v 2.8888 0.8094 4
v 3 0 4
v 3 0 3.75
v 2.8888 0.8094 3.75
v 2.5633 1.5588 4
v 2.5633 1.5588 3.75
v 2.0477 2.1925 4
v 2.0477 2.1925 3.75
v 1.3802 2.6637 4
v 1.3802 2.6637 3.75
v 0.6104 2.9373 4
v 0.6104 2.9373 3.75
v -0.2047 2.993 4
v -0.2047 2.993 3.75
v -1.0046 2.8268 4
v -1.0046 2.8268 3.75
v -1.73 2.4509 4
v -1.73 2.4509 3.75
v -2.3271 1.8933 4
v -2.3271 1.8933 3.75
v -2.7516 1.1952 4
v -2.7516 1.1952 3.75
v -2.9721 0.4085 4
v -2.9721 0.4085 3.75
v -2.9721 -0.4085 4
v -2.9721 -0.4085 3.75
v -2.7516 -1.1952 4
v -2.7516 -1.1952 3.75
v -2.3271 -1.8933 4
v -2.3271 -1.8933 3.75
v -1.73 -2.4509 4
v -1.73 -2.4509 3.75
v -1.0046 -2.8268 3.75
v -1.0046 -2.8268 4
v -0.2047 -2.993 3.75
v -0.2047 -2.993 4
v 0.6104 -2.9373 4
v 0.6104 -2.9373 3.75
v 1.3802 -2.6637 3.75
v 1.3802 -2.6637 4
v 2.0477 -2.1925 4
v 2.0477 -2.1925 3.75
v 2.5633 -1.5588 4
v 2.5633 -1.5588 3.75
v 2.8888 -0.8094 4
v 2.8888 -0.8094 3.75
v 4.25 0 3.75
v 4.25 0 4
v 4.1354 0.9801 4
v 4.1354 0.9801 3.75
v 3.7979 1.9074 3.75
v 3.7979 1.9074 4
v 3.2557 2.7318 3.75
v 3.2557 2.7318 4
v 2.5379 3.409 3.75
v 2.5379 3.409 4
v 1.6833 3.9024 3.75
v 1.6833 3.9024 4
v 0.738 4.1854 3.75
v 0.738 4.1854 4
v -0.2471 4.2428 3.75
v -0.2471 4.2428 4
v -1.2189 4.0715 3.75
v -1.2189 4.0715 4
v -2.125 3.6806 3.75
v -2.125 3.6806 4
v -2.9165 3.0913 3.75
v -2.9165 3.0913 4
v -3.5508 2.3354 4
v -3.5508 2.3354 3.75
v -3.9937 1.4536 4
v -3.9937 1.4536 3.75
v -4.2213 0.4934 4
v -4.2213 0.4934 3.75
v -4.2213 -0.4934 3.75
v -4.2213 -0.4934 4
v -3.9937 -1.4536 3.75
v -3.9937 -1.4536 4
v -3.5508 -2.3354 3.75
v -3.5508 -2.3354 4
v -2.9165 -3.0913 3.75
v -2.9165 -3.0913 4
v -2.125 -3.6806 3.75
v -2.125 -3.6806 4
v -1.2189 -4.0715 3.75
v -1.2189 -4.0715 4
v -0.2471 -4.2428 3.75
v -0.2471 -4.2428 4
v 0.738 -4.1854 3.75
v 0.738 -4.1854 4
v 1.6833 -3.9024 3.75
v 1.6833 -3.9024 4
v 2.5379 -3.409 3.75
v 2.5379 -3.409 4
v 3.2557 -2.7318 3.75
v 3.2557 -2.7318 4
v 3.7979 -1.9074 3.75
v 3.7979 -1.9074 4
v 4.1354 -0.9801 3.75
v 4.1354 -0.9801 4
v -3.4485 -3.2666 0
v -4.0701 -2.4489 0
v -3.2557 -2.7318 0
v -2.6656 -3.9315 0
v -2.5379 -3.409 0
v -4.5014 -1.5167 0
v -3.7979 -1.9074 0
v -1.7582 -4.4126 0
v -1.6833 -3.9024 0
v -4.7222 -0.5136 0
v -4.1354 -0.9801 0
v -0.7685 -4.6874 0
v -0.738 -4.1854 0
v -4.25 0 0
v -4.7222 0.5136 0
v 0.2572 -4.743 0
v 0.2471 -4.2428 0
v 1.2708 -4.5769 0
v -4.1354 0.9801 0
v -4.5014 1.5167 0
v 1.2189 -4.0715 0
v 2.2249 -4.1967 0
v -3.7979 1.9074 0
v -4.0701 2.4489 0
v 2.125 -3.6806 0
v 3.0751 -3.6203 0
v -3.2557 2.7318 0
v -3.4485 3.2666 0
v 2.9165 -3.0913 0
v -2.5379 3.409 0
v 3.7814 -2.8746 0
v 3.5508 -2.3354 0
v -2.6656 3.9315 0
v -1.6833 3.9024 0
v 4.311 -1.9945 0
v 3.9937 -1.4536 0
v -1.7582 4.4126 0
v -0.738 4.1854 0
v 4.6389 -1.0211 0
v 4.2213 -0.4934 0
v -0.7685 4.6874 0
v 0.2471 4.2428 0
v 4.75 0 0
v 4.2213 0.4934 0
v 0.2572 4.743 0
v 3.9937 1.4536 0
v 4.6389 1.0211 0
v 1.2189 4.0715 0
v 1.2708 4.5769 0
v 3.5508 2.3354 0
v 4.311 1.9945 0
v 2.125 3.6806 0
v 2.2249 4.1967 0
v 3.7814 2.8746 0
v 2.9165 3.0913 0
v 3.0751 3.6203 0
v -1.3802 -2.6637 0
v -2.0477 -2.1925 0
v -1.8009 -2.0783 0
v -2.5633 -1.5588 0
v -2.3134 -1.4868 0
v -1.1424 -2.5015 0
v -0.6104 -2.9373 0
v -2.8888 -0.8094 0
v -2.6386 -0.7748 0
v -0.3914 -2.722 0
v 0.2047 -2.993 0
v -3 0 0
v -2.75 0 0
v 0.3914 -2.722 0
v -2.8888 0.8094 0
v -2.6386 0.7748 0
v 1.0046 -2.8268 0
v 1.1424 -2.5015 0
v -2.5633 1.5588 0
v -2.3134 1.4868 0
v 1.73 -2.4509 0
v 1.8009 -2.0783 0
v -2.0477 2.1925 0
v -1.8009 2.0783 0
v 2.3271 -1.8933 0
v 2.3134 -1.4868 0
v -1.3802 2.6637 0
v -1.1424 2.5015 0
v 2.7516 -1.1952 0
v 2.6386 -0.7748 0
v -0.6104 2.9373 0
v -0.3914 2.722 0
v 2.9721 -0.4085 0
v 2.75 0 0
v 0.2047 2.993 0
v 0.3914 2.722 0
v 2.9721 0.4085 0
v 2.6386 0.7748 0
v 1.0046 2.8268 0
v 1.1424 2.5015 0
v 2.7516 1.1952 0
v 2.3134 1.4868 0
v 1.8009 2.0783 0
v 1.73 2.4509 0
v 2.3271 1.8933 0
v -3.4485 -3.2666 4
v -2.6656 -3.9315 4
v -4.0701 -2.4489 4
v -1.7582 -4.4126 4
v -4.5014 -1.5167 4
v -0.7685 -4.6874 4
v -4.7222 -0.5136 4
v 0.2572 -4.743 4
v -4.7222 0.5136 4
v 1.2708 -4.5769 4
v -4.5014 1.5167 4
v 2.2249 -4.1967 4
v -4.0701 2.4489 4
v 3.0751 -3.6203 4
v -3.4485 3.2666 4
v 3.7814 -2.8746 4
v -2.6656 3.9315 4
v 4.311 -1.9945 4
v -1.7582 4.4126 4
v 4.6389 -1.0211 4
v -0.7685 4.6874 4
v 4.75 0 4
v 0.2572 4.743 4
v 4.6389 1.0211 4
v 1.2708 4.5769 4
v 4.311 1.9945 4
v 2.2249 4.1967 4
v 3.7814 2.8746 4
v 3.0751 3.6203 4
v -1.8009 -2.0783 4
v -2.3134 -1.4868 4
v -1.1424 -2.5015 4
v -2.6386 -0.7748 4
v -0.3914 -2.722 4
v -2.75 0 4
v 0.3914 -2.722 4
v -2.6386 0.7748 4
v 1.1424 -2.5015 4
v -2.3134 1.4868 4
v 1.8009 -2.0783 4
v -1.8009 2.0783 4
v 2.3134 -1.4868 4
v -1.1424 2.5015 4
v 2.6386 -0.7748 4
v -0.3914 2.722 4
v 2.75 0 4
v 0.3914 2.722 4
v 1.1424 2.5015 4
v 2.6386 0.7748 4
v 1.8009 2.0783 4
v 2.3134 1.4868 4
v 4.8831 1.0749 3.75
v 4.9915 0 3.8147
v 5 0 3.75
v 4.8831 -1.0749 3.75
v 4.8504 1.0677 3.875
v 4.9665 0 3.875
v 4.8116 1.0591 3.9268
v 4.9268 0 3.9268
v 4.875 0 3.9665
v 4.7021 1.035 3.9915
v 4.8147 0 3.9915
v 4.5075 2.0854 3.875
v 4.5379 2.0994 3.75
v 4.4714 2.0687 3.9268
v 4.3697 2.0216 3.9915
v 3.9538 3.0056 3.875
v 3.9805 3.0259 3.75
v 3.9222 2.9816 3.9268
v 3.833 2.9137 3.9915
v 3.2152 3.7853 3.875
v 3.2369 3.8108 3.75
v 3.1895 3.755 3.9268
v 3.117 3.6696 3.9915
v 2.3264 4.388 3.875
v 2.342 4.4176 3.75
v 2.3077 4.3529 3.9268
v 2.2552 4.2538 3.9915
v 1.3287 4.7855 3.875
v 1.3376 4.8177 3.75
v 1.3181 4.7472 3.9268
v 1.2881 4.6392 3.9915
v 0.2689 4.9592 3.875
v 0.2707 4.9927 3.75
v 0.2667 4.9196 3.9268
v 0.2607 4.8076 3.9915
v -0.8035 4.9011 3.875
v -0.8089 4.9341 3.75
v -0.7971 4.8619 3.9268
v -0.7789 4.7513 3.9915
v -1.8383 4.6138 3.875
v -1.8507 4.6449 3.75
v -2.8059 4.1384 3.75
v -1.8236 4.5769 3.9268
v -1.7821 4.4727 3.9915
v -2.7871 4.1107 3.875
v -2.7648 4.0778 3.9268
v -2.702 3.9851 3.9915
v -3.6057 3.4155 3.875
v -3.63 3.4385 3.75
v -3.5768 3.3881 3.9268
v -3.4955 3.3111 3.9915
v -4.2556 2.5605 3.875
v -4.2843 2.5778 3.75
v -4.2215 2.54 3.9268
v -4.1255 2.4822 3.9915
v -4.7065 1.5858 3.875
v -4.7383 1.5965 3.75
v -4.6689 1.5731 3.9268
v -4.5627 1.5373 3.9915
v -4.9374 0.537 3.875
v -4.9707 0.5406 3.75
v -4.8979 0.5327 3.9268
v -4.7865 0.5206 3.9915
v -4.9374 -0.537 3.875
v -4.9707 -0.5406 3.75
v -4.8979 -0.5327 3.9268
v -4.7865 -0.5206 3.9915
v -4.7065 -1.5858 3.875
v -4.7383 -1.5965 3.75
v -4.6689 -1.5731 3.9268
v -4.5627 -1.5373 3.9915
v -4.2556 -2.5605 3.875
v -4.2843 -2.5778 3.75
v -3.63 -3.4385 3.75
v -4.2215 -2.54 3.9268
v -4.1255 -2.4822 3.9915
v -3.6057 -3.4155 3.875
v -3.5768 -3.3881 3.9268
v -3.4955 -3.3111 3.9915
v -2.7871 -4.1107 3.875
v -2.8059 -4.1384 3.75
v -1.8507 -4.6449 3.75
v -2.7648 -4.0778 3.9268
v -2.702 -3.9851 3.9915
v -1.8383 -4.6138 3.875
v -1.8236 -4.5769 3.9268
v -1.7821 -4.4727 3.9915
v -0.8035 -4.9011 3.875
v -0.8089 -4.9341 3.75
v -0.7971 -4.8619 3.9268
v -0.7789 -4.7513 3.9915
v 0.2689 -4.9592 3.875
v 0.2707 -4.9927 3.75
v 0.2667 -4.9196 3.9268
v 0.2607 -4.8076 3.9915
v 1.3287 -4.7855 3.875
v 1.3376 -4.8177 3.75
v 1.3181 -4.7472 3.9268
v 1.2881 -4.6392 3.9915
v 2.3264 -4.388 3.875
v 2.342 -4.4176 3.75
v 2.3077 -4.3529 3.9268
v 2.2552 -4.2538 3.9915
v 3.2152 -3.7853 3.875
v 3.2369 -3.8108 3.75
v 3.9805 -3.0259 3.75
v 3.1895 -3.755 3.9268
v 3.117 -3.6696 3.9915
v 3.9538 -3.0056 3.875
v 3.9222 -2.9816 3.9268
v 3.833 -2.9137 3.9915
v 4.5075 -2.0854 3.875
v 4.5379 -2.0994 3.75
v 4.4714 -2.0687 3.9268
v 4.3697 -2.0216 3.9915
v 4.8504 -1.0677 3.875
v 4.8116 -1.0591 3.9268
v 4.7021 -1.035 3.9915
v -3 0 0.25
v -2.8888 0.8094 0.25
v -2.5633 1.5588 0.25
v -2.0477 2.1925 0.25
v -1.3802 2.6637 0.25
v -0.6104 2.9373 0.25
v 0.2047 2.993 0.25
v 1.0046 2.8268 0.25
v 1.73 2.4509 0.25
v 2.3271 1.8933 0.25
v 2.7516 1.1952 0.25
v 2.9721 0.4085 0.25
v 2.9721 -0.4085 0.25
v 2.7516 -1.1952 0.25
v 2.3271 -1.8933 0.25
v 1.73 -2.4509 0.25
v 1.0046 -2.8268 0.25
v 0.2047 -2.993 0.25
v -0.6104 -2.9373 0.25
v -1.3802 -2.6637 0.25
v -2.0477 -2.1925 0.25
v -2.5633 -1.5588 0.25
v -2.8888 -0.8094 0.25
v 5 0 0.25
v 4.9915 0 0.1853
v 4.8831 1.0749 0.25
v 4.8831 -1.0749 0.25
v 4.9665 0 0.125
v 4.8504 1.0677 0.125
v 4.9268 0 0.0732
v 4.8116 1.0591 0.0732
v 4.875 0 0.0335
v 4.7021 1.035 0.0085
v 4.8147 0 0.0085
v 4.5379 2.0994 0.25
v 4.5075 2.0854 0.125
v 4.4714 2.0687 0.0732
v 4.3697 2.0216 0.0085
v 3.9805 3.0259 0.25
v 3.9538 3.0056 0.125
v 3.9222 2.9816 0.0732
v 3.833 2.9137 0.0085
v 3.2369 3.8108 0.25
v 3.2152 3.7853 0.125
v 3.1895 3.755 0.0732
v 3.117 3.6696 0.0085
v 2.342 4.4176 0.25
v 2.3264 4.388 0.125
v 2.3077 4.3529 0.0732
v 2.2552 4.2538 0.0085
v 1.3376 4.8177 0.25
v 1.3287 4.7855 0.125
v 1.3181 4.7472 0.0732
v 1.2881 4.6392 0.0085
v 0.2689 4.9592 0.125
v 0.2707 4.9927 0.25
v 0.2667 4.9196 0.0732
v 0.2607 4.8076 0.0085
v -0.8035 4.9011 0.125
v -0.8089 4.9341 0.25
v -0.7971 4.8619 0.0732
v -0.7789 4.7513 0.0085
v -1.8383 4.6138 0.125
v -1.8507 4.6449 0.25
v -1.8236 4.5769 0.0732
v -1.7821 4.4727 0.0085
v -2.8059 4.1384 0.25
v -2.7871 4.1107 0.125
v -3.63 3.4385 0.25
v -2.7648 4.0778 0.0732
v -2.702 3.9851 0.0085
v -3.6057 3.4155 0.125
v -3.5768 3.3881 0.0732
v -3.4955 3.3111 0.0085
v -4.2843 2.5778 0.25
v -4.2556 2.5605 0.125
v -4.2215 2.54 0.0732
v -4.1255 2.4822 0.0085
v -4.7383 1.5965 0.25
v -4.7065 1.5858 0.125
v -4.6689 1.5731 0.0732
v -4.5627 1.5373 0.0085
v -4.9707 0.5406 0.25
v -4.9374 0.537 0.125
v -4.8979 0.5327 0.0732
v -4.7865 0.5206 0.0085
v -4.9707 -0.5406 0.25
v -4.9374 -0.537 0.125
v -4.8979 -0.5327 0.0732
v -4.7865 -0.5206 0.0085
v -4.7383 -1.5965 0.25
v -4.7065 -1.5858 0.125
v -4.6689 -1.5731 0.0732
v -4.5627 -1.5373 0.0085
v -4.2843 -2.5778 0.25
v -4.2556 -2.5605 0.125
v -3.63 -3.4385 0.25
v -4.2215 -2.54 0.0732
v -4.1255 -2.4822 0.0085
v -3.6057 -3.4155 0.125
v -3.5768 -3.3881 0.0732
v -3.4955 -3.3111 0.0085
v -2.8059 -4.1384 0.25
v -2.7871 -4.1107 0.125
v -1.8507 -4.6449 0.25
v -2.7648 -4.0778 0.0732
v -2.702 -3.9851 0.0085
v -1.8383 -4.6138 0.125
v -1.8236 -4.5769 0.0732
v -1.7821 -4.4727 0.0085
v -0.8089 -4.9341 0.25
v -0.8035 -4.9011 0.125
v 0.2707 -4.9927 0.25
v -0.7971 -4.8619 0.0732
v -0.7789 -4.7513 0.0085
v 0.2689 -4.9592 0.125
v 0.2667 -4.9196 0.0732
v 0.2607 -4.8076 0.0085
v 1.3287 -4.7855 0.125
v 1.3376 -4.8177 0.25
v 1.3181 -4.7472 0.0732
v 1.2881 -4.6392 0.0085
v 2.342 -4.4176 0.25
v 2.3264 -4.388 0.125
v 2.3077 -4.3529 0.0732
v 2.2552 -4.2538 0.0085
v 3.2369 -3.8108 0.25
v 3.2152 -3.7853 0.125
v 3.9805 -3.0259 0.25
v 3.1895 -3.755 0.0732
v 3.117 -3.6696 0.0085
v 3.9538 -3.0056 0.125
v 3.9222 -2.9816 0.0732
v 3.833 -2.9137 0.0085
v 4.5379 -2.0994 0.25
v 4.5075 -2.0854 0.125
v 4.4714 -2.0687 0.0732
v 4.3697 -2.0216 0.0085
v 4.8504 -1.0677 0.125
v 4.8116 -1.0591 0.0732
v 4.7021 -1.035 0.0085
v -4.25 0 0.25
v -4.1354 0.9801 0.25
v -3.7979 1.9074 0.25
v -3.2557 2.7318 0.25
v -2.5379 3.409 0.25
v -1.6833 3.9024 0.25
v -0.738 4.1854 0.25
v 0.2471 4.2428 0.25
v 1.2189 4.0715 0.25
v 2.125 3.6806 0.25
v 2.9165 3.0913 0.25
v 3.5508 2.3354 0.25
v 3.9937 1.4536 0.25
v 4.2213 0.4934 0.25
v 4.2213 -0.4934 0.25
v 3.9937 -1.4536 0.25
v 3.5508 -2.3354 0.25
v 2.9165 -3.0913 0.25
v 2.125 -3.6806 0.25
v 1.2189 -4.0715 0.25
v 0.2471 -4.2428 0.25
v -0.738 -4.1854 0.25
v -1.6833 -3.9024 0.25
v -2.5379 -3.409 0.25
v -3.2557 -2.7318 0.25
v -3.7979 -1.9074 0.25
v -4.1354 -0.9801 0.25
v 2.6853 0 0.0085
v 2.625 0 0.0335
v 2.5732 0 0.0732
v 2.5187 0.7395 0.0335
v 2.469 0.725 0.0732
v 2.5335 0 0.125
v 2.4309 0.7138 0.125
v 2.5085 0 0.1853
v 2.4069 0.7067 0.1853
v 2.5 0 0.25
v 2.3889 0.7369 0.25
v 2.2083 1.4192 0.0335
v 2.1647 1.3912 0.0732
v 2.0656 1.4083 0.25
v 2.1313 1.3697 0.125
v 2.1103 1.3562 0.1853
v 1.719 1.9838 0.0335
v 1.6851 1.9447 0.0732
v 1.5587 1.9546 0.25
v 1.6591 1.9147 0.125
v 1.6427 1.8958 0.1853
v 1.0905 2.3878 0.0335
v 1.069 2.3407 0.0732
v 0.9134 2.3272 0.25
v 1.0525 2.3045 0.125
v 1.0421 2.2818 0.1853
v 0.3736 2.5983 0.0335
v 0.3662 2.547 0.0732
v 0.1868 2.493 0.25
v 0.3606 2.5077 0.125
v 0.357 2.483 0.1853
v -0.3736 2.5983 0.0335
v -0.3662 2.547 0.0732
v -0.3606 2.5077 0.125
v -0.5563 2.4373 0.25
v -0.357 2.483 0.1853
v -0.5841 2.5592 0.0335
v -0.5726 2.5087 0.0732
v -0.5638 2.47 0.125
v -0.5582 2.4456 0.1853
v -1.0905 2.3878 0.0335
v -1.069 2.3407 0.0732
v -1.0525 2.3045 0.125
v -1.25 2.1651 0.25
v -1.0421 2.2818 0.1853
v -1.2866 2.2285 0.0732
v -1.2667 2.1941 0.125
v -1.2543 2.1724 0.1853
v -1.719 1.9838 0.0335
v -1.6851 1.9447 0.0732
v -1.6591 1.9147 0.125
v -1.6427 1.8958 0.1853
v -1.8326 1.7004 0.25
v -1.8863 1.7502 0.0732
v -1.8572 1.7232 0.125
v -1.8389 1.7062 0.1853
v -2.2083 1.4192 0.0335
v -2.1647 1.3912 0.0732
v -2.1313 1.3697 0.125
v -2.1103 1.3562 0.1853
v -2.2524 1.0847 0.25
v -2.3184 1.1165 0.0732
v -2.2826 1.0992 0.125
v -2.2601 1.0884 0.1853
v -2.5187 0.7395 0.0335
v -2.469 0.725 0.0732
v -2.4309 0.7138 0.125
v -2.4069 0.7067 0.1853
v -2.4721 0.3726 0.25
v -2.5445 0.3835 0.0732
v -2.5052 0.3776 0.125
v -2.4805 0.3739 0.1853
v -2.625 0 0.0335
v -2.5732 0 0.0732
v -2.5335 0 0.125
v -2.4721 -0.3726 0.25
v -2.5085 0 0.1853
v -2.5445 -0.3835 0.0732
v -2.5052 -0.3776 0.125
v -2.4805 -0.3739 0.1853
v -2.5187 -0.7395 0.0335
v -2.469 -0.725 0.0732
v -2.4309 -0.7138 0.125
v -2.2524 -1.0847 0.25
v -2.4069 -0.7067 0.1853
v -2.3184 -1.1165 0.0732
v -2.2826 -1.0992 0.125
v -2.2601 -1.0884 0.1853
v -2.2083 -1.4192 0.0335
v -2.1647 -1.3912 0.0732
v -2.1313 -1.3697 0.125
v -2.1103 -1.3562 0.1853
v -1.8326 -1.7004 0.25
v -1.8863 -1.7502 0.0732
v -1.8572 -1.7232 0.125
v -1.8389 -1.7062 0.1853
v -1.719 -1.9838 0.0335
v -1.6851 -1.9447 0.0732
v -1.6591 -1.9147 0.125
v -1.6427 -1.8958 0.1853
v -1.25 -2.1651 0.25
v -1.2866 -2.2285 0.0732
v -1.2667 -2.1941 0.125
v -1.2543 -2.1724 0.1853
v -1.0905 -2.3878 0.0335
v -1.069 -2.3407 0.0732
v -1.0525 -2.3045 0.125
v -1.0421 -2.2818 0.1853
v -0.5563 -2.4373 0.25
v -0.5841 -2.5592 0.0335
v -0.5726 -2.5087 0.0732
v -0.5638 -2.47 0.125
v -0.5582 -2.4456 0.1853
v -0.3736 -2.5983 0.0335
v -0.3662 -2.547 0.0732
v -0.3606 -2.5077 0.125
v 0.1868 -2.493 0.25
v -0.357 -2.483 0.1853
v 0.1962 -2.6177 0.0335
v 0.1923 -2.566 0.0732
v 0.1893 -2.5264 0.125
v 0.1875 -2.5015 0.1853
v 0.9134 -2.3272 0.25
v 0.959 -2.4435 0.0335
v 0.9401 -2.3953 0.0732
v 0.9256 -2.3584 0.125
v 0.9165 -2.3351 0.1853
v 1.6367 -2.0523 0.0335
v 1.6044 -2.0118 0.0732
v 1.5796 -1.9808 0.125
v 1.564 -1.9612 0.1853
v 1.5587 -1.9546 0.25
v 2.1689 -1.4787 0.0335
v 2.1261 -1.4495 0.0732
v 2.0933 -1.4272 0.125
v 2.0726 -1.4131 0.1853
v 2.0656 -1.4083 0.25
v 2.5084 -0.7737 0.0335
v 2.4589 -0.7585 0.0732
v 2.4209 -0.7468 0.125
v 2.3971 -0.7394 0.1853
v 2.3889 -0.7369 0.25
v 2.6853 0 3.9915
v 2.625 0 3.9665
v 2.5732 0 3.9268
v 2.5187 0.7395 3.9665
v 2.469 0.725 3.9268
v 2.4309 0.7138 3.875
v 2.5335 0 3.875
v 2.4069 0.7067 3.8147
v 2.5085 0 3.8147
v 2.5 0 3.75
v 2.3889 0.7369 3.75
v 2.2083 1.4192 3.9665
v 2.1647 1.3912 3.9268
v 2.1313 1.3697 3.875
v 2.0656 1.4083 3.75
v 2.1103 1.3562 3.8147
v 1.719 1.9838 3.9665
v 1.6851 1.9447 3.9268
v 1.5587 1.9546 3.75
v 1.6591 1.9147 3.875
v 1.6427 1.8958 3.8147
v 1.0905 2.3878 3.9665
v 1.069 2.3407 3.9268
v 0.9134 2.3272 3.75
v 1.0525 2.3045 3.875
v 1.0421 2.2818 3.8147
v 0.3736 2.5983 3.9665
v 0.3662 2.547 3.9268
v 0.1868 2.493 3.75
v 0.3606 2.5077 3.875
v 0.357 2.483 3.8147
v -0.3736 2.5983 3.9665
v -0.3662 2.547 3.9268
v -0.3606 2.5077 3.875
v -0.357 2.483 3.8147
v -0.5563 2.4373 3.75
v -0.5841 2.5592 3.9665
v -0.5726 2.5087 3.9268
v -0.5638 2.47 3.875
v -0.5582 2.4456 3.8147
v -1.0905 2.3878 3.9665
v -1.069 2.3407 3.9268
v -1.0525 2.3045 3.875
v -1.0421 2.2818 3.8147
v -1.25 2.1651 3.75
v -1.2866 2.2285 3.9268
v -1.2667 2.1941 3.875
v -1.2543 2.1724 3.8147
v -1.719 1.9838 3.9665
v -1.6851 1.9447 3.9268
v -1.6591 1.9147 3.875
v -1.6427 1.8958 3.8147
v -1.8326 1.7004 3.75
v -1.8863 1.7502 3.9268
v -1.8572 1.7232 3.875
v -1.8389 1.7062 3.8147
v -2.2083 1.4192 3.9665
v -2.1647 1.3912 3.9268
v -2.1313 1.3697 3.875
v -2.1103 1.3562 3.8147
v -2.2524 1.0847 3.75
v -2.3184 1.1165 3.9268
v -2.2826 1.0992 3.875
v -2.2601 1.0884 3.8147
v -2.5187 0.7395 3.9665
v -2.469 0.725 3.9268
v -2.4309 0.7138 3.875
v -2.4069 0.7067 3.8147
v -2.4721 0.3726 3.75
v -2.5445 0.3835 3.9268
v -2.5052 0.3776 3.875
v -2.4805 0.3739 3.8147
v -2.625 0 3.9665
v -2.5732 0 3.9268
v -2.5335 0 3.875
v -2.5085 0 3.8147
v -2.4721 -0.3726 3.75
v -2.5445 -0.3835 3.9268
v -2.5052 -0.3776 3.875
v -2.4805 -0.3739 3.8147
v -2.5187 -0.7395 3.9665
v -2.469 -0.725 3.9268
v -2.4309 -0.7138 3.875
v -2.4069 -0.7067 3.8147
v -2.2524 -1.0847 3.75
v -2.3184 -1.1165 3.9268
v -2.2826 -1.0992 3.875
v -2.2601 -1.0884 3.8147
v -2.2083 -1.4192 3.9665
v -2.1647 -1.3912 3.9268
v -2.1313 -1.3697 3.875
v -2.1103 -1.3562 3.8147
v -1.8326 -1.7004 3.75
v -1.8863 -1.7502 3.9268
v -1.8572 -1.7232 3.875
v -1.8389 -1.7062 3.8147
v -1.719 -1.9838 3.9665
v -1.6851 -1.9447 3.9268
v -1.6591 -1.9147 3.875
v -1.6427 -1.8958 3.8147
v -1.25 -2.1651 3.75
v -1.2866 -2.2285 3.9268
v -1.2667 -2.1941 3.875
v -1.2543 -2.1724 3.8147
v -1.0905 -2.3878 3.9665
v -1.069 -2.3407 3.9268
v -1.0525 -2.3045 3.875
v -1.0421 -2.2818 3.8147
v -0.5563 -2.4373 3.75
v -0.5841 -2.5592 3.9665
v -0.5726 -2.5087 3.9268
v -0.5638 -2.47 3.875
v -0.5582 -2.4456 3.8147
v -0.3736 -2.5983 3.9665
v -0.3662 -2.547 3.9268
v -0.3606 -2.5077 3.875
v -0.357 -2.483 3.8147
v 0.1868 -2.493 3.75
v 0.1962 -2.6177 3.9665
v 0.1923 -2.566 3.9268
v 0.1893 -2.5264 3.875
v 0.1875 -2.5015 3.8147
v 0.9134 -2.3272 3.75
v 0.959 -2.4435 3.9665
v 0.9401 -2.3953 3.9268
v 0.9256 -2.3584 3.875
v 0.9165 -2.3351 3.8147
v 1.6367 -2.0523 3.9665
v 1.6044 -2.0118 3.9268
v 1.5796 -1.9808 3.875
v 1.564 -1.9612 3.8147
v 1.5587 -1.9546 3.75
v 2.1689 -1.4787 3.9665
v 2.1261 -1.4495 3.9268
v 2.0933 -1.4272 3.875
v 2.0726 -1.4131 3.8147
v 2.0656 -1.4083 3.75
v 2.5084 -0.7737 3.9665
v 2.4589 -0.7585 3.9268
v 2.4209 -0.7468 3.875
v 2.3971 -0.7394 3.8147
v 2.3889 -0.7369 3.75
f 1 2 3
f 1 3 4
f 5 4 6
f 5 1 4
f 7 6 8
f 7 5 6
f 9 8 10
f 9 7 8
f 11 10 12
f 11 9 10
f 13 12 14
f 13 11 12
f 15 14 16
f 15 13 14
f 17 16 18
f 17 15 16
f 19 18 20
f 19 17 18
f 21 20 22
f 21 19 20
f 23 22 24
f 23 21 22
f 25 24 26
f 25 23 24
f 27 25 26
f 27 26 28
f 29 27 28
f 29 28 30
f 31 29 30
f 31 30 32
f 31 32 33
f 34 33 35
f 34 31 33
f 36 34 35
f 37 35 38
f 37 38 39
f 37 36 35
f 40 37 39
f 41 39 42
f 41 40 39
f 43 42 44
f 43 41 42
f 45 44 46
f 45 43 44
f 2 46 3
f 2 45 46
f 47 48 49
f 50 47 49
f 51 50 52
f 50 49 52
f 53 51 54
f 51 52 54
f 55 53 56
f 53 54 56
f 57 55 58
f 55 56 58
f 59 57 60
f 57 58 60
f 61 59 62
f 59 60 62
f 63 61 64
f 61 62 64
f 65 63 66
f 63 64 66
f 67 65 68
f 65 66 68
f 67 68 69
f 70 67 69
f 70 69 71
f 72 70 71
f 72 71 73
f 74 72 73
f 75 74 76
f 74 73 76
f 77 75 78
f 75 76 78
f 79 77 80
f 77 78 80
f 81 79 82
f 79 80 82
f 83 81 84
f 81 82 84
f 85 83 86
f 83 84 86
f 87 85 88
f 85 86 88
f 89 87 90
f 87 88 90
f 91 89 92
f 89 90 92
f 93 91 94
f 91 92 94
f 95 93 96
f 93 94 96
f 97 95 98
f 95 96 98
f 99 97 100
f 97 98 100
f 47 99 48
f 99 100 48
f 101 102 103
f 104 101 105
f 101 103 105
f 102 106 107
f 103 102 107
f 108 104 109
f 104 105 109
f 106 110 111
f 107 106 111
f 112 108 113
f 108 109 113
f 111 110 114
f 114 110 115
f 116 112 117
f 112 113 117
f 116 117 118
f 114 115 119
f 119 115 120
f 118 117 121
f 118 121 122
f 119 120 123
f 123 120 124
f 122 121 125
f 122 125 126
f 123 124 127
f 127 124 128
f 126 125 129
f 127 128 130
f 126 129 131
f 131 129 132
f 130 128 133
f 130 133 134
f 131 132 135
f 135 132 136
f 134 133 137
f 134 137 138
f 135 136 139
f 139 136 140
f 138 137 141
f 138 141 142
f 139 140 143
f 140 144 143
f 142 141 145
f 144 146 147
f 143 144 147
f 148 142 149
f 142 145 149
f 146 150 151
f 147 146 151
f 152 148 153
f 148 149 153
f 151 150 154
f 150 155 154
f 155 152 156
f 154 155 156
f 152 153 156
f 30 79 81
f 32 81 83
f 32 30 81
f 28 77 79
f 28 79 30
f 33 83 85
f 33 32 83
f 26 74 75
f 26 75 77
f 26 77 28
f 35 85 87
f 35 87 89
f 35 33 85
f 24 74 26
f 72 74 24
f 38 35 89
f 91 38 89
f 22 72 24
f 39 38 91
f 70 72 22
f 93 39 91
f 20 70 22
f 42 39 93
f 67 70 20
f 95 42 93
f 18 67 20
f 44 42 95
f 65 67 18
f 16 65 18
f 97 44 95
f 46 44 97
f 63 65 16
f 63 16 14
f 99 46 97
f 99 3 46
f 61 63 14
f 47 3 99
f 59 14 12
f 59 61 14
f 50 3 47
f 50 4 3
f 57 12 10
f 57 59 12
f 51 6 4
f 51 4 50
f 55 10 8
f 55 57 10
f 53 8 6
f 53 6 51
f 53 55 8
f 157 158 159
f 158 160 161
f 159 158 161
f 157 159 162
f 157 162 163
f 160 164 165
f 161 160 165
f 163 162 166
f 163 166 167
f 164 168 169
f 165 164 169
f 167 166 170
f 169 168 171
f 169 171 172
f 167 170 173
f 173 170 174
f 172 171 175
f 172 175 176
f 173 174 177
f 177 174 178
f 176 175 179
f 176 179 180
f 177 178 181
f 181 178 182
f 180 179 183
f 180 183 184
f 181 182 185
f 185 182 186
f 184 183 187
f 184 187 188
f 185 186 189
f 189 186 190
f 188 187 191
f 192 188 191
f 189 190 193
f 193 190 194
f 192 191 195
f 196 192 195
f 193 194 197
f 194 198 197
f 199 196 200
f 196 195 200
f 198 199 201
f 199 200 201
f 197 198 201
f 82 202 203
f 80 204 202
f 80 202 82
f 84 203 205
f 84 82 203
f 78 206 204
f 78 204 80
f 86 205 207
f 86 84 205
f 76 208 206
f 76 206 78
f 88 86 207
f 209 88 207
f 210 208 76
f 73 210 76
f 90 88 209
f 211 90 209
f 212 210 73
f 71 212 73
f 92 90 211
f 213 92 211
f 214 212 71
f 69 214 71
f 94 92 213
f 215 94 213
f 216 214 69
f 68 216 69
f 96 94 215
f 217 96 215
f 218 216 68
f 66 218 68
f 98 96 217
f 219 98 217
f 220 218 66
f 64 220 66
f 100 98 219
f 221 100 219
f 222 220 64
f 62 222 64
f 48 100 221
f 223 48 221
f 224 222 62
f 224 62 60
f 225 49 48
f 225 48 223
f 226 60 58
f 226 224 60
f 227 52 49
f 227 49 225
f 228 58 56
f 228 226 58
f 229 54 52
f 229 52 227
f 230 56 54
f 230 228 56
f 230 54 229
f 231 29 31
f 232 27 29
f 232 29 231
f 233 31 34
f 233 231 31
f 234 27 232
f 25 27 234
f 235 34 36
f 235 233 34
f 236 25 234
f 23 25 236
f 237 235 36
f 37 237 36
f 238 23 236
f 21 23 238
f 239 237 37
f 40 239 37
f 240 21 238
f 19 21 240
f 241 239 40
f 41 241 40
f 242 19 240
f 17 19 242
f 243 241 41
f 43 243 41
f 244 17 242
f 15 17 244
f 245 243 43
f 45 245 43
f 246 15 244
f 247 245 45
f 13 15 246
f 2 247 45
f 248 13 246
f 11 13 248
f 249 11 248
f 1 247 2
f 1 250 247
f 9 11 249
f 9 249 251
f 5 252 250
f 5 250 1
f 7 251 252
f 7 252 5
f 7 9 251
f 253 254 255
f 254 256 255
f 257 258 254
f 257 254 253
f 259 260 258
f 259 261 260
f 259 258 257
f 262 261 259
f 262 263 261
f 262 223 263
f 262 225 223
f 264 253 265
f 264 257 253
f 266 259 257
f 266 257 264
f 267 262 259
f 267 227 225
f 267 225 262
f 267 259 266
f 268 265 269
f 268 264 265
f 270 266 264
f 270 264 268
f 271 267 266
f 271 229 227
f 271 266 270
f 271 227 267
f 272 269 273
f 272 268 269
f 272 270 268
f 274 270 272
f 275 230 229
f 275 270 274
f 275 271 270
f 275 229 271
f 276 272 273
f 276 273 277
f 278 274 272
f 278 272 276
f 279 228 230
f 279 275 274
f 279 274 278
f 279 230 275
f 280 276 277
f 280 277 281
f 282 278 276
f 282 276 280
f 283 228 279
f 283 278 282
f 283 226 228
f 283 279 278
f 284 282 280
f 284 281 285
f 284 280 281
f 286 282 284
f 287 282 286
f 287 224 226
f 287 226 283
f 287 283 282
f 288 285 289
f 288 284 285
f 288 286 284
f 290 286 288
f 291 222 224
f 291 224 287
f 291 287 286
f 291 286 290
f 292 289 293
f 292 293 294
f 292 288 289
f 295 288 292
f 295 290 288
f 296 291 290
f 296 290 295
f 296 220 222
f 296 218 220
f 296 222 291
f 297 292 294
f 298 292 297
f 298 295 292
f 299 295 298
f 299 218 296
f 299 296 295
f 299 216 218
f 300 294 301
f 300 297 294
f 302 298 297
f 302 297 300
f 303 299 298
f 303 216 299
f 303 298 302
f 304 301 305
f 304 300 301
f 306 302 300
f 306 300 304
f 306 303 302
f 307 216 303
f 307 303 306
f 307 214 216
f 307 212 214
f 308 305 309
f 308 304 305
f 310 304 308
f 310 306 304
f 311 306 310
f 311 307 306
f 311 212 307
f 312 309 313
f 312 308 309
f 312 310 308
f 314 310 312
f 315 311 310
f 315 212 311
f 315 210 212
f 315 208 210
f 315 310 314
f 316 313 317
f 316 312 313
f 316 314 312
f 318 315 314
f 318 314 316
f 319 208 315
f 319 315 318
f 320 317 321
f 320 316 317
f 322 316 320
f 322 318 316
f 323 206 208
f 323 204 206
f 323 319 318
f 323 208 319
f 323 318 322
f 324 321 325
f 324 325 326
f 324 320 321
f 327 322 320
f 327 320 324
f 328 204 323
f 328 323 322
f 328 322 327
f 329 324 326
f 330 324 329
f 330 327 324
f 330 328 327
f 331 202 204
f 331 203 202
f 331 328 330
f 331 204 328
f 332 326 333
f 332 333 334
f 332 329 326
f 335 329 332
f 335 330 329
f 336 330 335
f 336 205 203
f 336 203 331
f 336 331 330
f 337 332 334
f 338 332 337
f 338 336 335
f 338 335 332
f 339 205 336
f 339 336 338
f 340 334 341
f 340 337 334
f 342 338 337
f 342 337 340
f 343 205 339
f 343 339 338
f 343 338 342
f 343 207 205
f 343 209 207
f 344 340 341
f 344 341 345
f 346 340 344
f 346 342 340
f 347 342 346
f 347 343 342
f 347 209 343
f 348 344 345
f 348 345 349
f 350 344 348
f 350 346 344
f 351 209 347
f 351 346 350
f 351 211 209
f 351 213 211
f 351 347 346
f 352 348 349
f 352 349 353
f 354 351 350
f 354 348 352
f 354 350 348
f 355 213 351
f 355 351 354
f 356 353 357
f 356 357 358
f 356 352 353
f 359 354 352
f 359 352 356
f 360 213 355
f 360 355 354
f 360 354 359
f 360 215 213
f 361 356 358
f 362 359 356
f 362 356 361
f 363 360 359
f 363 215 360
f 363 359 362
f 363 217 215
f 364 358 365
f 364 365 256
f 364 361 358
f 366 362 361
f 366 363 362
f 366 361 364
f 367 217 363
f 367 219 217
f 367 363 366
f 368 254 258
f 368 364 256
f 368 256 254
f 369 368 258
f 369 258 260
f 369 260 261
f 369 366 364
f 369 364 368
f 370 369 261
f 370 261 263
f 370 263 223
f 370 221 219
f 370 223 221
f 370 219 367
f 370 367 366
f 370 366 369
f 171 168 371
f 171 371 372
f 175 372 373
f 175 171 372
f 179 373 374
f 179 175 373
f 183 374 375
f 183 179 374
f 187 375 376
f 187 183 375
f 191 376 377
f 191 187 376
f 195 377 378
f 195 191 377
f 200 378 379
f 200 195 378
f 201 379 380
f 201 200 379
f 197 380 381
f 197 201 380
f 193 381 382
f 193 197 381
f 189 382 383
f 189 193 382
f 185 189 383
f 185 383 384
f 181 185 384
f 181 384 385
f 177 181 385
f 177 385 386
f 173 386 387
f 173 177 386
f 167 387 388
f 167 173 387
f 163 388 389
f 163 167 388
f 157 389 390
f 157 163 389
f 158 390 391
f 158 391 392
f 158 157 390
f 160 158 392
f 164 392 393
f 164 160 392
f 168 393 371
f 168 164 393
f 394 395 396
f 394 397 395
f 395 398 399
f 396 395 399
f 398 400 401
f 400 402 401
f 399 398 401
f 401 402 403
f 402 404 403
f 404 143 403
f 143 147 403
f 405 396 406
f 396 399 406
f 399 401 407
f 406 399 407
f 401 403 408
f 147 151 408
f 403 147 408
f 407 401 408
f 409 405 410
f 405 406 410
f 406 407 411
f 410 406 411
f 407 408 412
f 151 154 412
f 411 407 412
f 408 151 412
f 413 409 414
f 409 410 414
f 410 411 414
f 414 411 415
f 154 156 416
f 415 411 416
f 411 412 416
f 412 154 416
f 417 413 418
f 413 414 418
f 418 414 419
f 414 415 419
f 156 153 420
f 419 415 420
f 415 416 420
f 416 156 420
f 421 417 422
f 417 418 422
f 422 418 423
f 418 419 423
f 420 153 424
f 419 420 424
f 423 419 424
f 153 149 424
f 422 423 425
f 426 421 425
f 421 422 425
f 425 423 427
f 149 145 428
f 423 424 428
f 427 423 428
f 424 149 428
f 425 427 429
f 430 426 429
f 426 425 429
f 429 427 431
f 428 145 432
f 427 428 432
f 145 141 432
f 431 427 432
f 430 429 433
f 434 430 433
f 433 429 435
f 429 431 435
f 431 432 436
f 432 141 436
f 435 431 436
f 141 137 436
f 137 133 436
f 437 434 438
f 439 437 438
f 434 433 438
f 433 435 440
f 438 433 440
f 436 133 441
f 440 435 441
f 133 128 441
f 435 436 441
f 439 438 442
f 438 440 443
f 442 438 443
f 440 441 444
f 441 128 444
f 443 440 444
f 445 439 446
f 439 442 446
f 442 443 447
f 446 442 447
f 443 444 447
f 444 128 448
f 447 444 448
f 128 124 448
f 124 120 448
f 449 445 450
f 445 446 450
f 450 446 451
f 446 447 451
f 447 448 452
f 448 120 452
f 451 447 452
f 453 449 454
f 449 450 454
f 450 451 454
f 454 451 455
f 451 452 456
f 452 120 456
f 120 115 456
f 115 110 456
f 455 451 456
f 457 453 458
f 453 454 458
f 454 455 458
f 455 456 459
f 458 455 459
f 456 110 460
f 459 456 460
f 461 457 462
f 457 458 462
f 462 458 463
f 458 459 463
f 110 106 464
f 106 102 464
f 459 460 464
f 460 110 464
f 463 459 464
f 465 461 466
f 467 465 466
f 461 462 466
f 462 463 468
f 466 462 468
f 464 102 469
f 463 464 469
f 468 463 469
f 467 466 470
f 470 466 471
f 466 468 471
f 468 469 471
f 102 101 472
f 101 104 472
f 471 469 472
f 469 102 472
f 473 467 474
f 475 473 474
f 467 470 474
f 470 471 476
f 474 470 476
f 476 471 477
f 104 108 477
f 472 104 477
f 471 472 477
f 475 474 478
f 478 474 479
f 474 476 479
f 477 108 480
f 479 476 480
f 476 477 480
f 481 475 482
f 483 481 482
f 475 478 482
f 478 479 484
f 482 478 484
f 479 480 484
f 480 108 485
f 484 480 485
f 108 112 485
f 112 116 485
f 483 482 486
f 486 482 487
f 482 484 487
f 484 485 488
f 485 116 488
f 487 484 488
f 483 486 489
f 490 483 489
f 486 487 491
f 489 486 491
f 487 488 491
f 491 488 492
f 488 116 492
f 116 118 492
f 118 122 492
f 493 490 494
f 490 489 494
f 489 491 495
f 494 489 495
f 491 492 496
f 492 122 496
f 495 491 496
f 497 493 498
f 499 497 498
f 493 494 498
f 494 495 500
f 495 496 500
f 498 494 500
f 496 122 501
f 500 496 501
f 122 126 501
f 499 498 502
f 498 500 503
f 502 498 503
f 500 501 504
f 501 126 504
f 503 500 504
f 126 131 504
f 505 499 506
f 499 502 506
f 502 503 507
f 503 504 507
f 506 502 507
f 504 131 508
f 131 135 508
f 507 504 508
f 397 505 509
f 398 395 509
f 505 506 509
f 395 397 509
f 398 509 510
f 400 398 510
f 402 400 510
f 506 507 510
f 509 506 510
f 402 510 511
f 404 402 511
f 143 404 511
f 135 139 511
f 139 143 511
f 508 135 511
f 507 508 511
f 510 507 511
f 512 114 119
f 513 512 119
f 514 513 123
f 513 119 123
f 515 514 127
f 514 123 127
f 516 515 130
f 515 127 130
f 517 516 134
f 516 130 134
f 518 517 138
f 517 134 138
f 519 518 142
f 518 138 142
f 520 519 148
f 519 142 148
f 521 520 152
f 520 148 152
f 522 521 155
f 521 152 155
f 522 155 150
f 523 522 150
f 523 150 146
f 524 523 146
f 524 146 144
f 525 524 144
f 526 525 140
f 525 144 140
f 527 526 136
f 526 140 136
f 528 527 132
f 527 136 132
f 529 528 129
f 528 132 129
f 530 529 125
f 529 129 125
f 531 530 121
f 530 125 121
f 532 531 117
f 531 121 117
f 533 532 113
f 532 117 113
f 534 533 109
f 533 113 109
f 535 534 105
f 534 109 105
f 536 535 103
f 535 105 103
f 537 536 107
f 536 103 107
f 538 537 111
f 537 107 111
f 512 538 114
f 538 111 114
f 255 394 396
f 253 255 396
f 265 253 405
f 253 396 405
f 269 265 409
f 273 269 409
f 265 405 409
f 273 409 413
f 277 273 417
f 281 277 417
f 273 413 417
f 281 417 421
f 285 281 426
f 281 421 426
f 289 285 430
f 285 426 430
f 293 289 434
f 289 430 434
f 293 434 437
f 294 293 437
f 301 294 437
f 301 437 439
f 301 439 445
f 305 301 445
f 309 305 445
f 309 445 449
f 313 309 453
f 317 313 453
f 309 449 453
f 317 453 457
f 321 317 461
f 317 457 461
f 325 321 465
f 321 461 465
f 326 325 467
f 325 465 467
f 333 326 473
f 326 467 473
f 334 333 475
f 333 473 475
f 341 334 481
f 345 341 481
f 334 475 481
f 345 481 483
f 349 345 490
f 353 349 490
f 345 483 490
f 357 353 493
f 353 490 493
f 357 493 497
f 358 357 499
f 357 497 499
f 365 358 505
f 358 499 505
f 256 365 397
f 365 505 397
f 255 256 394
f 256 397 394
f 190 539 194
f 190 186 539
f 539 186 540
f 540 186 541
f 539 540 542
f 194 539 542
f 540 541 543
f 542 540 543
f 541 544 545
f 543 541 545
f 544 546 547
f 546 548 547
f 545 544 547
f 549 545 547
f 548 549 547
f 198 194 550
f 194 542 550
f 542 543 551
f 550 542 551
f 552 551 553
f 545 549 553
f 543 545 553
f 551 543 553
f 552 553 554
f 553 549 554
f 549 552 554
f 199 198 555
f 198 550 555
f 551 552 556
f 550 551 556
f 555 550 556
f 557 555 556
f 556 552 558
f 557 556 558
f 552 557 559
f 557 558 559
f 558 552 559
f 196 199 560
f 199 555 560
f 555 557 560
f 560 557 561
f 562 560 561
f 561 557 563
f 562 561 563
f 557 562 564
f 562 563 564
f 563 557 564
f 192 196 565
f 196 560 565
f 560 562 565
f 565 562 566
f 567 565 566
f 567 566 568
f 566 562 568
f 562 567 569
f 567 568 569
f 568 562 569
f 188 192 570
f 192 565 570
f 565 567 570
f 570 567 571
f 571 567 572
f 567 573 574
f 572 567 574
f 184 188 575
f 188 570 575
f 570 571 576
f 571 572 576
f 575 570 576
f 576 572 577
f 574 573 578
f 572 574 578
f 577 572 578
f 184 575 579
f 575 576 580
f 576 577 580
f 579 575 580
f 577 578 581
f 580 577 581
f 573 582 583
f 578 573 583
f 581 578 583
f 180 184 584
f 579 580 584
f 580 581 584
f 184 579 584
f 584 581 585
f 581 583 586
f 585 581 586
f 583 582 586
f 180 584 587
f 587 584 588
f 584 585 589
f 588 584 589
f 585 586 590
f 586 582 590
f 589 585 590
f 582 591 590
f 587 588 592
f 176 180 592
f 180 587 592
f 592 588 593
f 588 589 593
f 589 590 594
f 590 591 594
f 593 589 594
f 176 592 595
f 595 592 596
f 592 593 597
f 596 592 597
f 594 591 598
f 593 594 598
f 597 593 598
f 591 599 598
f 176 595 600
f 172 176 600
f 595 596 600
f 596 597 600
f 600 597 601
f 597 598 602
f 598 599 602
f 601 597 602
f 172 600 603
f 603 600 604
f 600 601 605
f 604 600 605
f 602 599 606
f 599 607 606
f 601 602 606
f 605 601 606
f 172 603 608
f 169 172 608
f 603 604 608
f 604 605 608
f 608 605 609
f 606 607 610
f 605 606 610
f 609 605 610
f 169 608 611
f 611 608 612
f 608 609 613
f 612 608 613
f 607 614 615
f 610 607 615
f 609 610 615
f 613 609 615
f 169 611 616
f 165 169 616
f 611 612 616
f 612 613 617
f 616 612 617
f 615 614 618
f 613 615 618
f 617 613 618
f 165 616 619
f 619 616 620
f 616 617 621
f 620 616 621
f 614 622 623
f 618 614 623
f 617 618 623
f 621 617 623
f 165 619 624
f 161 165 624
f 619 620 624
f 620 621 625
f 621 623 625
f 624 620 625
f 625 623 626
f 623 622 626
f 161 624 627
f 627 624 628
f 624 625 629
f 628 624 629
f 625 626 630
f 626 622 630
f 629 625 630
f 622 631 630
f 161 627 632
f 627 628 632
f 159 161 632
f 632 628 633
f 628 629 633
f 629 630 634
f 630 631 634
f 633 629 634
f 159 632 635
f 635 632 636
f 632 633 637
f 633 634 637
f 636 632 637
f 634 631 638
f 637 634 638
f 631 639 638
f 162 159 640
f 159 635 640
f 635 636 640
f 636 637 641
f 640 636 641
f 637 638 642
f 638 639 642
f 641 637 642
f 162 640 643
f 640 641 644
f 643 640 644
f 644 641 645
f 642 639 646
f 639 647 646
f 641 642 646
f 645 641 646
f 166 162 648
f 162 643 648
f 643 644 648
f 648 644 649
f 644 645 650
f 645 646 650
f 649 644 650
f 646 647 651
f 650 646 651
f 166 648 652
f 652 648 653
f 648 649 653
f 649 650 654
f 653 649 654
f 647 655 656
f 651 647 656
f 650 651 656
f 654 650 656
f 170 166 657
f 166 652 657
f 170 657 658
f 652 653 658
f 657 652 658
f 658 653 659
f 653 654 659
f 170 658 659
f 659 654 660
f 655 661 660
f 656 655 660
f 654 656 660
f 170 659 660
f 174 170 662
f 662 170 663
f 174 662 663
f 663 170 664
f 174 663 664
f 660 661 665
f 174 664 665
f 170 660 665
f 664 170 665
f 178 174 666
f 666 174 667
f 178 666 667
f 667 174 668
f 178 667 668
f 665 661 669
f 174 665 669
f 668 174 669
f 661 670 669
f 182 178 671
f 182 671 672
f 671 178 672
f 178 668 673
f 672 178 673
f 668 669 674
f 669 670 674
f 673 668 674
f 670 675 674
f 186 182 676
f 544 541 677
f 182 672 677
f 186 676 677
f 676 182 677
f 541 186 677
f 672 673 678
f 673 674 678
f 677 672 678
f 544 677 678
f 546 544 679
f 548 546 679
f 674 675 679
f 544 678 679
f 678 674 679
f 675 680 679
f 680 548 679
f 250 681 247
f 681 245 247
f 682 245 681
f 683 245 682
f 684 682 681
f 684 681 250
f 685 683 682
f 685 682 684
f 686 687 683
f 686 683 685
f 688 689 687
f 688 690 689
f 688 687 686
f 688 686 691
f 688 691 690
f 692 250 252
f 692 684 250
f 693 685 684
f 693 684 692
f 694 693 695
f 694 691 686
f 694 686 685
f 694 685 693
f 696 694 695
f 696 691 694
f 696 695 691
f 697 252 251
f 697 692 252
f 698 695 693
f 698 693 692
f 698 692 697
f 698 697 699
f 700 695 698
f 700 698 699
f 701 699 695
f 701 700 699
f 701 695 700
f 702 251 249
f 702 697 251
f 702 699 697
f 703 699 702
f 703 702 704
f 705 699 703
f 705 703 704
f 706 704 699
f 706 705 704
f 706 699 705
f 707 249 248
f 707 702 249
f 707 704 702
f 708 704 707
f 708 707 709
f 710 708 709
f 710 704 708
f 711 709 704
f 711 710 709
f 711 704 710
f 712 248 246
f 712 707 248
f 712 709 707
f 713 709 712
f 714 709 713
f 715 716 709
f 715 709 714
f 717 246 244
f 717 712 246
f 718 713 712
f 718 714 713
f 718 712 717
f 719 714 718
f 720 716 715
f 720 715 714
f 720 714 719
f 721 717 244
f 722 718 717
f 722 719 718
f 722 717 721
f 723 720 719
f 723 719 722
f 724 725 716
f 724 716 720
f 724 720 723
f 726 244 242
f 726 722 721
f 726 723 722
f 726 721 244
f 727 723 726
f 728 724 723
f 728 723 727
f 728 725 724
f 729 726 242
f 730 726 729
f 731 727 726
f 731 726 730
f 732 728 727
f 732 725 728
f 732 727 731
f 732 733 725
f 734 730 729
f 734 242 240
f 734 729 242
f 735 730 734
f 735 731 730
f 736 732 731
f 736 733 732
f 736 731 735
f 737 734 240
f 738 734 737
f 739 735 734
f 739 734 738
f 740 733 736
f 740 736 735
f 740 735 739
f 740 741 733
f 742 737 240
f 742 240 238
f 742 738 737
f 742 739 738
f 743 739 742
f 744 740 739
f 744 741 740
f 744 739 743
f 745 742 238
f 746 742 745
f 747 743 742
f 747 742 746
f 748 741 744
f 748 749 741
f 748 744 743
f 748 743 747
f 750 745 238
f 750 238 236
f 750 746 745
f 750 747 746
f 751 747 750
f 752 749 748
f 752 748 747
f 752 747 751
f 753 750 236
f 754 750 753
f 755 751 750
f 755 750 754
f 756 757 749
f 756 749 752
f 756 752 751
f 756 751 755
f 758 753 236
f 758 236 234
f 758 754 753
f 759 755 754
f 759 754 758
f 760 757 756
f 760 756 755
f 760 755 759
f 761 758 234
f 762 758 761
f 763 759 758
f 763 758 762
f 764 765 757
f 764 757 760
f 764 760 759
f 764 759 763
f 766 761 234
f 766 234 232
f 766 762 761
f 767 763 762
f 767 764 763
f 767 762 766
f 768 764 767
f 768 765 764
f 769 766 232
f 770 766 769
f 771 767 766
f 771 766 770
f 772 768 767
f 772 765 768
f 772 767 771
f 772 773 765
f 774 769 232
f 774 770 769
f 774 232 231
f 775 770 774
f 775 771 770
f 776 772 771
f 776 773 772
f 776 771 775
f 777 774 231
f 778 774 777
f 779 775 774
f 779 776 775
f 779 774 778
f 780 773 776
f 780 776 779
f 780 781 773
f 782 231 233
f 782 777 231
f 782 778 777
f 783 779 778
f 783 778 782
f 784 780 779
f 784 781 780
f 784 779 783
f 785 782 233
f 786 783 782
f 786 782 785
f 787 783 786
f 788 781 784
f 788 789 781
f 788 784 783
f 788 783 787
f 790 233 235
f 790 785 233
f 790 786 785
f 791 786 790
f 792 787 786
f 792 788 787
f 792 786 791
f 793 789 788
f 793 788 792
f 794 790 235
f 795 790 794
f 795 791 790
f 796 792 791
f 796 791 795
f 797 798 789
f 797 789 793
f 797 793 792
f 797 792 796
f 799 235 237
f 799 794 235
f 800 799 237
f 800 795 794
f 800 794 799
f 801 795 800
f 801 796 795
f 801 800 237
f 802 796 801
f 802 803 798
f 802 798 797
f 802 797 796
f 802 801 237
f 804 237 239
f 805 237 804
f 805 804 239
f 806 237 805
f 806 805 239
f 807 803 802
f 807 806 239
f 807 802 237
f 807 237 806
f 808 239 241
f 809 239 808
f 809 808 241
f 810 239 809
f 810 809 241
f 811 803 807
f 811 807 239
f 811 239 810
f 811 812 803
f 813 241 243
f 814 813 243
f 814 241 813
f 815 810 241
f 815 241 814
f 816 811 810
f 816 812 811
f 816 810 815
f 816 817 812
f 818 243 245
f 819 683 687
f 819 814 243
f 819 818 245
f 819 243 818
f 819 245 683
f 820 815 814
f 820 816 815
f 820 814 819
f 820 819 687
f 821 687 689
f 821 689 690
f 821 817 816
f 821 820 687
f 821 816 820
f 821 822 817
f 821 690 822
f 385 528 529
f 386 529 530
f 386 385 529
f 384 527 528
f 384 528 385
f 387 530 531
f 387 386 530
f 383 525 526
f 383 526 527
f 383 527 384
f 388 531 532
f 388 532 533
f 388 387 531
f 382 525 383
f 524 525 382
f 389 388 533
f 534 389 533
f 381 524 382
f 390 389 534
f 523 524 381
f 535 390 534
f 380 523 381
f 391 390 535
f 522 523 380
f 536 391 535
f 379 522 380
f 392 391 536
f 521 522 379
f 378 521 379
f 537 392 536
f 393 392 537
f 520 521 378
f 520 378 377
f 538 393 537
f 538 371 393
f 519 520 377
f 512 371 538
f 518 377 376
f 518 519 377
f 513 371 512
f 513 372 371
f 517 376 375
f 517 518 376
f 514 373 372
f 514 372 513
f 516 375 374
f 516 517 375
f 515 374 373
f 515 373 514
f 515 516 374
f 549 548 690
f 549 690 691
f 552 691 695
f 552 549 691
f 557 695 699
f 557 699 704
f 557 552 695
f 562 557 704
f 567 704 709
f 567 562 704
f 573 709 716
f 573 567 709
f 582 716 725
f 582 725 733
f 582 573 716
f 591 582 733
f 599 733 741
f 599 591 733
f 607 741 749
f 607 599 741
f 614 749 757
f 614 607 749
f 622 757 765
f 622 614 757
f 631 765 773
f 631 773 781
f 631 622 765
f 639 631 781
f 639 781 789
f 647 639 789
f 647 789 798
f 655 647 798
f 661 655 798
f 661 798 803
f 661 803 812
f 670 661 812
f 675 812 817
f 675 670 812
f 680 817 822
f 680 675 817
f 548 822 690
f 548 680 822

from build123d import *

# Parameters (mm, degrees)
SKETCH1_R           = 5
SKETCH1_R_2         = 2.5
BOSS_EXTRUDE1_DEPTH = 4
FILLET1_R           = 0.25
FILLET2_R           = 0.25
SKETCH2_R           = 4.25
SKETCH2_R_2         = 3
CUT_EXTRUDE1_DEPTH  = 0.25
SKETCH3_R           = 4.25
SKETCH3_R_2         = 3
CUT_EXTRUDE2_DEPTH  = 0.25


with BuildPart() as part:
    # Sketch1 → Boss-Extrude1 (new body)
    with BuildSketch(Plane.XY):
        Circle(SKETCH1_R)
        Circle(SKETCH1_R_2, mode=Mode.SUBTRACT)
    extrude(amount=BOSS_EXTRUDE1_DEPTH)

    # Fillet1
    fillet1_edges = [part.edges().sort_by_distance(p)[0] for p in [
        (-5, 0, 0),
        (-5, 0, 4),
    ]]
    fillet(fillet1_edges, radius=FILLET1_R)

    # Fillet2
    fillet2_edges = [part.edges().sort_by_distance(p)[0] for p in [
        (-2.5, 0, 0),
        (-2.5, 0, 4),
    ]]
    fillet(fillet2_edges, radius=FILLET2_R)

    # Sketch2 → Cut-Extrude1 (cut)
    with BuildSketch(Plane.XY.offset(4)):
        Circle(SKETCH2_R)
        Circle(SKETCH2_R_2, mode=Mode.SUBTRACT)
    extrude(amount=-CUT_EXTRUDE1_DEPTH, mode=Mode.SUBTRACT)

    # Sketch3 → Cut-Extrude2 (cut)
    with BuildSketch(Plane(origin=(0, 0, 0), x_dir=(-1, 0, 0), z_dir=(0, 0, -1))):
        Circle(SKETCH3_R)
        Circle(SKETCH3_R_2, mode=Mode.SUBTRACT)
    extrude(amount=-CUT_EXTRUDE2_DEPTH, mode=Mode.SUBTRACT)


solid = part.part
